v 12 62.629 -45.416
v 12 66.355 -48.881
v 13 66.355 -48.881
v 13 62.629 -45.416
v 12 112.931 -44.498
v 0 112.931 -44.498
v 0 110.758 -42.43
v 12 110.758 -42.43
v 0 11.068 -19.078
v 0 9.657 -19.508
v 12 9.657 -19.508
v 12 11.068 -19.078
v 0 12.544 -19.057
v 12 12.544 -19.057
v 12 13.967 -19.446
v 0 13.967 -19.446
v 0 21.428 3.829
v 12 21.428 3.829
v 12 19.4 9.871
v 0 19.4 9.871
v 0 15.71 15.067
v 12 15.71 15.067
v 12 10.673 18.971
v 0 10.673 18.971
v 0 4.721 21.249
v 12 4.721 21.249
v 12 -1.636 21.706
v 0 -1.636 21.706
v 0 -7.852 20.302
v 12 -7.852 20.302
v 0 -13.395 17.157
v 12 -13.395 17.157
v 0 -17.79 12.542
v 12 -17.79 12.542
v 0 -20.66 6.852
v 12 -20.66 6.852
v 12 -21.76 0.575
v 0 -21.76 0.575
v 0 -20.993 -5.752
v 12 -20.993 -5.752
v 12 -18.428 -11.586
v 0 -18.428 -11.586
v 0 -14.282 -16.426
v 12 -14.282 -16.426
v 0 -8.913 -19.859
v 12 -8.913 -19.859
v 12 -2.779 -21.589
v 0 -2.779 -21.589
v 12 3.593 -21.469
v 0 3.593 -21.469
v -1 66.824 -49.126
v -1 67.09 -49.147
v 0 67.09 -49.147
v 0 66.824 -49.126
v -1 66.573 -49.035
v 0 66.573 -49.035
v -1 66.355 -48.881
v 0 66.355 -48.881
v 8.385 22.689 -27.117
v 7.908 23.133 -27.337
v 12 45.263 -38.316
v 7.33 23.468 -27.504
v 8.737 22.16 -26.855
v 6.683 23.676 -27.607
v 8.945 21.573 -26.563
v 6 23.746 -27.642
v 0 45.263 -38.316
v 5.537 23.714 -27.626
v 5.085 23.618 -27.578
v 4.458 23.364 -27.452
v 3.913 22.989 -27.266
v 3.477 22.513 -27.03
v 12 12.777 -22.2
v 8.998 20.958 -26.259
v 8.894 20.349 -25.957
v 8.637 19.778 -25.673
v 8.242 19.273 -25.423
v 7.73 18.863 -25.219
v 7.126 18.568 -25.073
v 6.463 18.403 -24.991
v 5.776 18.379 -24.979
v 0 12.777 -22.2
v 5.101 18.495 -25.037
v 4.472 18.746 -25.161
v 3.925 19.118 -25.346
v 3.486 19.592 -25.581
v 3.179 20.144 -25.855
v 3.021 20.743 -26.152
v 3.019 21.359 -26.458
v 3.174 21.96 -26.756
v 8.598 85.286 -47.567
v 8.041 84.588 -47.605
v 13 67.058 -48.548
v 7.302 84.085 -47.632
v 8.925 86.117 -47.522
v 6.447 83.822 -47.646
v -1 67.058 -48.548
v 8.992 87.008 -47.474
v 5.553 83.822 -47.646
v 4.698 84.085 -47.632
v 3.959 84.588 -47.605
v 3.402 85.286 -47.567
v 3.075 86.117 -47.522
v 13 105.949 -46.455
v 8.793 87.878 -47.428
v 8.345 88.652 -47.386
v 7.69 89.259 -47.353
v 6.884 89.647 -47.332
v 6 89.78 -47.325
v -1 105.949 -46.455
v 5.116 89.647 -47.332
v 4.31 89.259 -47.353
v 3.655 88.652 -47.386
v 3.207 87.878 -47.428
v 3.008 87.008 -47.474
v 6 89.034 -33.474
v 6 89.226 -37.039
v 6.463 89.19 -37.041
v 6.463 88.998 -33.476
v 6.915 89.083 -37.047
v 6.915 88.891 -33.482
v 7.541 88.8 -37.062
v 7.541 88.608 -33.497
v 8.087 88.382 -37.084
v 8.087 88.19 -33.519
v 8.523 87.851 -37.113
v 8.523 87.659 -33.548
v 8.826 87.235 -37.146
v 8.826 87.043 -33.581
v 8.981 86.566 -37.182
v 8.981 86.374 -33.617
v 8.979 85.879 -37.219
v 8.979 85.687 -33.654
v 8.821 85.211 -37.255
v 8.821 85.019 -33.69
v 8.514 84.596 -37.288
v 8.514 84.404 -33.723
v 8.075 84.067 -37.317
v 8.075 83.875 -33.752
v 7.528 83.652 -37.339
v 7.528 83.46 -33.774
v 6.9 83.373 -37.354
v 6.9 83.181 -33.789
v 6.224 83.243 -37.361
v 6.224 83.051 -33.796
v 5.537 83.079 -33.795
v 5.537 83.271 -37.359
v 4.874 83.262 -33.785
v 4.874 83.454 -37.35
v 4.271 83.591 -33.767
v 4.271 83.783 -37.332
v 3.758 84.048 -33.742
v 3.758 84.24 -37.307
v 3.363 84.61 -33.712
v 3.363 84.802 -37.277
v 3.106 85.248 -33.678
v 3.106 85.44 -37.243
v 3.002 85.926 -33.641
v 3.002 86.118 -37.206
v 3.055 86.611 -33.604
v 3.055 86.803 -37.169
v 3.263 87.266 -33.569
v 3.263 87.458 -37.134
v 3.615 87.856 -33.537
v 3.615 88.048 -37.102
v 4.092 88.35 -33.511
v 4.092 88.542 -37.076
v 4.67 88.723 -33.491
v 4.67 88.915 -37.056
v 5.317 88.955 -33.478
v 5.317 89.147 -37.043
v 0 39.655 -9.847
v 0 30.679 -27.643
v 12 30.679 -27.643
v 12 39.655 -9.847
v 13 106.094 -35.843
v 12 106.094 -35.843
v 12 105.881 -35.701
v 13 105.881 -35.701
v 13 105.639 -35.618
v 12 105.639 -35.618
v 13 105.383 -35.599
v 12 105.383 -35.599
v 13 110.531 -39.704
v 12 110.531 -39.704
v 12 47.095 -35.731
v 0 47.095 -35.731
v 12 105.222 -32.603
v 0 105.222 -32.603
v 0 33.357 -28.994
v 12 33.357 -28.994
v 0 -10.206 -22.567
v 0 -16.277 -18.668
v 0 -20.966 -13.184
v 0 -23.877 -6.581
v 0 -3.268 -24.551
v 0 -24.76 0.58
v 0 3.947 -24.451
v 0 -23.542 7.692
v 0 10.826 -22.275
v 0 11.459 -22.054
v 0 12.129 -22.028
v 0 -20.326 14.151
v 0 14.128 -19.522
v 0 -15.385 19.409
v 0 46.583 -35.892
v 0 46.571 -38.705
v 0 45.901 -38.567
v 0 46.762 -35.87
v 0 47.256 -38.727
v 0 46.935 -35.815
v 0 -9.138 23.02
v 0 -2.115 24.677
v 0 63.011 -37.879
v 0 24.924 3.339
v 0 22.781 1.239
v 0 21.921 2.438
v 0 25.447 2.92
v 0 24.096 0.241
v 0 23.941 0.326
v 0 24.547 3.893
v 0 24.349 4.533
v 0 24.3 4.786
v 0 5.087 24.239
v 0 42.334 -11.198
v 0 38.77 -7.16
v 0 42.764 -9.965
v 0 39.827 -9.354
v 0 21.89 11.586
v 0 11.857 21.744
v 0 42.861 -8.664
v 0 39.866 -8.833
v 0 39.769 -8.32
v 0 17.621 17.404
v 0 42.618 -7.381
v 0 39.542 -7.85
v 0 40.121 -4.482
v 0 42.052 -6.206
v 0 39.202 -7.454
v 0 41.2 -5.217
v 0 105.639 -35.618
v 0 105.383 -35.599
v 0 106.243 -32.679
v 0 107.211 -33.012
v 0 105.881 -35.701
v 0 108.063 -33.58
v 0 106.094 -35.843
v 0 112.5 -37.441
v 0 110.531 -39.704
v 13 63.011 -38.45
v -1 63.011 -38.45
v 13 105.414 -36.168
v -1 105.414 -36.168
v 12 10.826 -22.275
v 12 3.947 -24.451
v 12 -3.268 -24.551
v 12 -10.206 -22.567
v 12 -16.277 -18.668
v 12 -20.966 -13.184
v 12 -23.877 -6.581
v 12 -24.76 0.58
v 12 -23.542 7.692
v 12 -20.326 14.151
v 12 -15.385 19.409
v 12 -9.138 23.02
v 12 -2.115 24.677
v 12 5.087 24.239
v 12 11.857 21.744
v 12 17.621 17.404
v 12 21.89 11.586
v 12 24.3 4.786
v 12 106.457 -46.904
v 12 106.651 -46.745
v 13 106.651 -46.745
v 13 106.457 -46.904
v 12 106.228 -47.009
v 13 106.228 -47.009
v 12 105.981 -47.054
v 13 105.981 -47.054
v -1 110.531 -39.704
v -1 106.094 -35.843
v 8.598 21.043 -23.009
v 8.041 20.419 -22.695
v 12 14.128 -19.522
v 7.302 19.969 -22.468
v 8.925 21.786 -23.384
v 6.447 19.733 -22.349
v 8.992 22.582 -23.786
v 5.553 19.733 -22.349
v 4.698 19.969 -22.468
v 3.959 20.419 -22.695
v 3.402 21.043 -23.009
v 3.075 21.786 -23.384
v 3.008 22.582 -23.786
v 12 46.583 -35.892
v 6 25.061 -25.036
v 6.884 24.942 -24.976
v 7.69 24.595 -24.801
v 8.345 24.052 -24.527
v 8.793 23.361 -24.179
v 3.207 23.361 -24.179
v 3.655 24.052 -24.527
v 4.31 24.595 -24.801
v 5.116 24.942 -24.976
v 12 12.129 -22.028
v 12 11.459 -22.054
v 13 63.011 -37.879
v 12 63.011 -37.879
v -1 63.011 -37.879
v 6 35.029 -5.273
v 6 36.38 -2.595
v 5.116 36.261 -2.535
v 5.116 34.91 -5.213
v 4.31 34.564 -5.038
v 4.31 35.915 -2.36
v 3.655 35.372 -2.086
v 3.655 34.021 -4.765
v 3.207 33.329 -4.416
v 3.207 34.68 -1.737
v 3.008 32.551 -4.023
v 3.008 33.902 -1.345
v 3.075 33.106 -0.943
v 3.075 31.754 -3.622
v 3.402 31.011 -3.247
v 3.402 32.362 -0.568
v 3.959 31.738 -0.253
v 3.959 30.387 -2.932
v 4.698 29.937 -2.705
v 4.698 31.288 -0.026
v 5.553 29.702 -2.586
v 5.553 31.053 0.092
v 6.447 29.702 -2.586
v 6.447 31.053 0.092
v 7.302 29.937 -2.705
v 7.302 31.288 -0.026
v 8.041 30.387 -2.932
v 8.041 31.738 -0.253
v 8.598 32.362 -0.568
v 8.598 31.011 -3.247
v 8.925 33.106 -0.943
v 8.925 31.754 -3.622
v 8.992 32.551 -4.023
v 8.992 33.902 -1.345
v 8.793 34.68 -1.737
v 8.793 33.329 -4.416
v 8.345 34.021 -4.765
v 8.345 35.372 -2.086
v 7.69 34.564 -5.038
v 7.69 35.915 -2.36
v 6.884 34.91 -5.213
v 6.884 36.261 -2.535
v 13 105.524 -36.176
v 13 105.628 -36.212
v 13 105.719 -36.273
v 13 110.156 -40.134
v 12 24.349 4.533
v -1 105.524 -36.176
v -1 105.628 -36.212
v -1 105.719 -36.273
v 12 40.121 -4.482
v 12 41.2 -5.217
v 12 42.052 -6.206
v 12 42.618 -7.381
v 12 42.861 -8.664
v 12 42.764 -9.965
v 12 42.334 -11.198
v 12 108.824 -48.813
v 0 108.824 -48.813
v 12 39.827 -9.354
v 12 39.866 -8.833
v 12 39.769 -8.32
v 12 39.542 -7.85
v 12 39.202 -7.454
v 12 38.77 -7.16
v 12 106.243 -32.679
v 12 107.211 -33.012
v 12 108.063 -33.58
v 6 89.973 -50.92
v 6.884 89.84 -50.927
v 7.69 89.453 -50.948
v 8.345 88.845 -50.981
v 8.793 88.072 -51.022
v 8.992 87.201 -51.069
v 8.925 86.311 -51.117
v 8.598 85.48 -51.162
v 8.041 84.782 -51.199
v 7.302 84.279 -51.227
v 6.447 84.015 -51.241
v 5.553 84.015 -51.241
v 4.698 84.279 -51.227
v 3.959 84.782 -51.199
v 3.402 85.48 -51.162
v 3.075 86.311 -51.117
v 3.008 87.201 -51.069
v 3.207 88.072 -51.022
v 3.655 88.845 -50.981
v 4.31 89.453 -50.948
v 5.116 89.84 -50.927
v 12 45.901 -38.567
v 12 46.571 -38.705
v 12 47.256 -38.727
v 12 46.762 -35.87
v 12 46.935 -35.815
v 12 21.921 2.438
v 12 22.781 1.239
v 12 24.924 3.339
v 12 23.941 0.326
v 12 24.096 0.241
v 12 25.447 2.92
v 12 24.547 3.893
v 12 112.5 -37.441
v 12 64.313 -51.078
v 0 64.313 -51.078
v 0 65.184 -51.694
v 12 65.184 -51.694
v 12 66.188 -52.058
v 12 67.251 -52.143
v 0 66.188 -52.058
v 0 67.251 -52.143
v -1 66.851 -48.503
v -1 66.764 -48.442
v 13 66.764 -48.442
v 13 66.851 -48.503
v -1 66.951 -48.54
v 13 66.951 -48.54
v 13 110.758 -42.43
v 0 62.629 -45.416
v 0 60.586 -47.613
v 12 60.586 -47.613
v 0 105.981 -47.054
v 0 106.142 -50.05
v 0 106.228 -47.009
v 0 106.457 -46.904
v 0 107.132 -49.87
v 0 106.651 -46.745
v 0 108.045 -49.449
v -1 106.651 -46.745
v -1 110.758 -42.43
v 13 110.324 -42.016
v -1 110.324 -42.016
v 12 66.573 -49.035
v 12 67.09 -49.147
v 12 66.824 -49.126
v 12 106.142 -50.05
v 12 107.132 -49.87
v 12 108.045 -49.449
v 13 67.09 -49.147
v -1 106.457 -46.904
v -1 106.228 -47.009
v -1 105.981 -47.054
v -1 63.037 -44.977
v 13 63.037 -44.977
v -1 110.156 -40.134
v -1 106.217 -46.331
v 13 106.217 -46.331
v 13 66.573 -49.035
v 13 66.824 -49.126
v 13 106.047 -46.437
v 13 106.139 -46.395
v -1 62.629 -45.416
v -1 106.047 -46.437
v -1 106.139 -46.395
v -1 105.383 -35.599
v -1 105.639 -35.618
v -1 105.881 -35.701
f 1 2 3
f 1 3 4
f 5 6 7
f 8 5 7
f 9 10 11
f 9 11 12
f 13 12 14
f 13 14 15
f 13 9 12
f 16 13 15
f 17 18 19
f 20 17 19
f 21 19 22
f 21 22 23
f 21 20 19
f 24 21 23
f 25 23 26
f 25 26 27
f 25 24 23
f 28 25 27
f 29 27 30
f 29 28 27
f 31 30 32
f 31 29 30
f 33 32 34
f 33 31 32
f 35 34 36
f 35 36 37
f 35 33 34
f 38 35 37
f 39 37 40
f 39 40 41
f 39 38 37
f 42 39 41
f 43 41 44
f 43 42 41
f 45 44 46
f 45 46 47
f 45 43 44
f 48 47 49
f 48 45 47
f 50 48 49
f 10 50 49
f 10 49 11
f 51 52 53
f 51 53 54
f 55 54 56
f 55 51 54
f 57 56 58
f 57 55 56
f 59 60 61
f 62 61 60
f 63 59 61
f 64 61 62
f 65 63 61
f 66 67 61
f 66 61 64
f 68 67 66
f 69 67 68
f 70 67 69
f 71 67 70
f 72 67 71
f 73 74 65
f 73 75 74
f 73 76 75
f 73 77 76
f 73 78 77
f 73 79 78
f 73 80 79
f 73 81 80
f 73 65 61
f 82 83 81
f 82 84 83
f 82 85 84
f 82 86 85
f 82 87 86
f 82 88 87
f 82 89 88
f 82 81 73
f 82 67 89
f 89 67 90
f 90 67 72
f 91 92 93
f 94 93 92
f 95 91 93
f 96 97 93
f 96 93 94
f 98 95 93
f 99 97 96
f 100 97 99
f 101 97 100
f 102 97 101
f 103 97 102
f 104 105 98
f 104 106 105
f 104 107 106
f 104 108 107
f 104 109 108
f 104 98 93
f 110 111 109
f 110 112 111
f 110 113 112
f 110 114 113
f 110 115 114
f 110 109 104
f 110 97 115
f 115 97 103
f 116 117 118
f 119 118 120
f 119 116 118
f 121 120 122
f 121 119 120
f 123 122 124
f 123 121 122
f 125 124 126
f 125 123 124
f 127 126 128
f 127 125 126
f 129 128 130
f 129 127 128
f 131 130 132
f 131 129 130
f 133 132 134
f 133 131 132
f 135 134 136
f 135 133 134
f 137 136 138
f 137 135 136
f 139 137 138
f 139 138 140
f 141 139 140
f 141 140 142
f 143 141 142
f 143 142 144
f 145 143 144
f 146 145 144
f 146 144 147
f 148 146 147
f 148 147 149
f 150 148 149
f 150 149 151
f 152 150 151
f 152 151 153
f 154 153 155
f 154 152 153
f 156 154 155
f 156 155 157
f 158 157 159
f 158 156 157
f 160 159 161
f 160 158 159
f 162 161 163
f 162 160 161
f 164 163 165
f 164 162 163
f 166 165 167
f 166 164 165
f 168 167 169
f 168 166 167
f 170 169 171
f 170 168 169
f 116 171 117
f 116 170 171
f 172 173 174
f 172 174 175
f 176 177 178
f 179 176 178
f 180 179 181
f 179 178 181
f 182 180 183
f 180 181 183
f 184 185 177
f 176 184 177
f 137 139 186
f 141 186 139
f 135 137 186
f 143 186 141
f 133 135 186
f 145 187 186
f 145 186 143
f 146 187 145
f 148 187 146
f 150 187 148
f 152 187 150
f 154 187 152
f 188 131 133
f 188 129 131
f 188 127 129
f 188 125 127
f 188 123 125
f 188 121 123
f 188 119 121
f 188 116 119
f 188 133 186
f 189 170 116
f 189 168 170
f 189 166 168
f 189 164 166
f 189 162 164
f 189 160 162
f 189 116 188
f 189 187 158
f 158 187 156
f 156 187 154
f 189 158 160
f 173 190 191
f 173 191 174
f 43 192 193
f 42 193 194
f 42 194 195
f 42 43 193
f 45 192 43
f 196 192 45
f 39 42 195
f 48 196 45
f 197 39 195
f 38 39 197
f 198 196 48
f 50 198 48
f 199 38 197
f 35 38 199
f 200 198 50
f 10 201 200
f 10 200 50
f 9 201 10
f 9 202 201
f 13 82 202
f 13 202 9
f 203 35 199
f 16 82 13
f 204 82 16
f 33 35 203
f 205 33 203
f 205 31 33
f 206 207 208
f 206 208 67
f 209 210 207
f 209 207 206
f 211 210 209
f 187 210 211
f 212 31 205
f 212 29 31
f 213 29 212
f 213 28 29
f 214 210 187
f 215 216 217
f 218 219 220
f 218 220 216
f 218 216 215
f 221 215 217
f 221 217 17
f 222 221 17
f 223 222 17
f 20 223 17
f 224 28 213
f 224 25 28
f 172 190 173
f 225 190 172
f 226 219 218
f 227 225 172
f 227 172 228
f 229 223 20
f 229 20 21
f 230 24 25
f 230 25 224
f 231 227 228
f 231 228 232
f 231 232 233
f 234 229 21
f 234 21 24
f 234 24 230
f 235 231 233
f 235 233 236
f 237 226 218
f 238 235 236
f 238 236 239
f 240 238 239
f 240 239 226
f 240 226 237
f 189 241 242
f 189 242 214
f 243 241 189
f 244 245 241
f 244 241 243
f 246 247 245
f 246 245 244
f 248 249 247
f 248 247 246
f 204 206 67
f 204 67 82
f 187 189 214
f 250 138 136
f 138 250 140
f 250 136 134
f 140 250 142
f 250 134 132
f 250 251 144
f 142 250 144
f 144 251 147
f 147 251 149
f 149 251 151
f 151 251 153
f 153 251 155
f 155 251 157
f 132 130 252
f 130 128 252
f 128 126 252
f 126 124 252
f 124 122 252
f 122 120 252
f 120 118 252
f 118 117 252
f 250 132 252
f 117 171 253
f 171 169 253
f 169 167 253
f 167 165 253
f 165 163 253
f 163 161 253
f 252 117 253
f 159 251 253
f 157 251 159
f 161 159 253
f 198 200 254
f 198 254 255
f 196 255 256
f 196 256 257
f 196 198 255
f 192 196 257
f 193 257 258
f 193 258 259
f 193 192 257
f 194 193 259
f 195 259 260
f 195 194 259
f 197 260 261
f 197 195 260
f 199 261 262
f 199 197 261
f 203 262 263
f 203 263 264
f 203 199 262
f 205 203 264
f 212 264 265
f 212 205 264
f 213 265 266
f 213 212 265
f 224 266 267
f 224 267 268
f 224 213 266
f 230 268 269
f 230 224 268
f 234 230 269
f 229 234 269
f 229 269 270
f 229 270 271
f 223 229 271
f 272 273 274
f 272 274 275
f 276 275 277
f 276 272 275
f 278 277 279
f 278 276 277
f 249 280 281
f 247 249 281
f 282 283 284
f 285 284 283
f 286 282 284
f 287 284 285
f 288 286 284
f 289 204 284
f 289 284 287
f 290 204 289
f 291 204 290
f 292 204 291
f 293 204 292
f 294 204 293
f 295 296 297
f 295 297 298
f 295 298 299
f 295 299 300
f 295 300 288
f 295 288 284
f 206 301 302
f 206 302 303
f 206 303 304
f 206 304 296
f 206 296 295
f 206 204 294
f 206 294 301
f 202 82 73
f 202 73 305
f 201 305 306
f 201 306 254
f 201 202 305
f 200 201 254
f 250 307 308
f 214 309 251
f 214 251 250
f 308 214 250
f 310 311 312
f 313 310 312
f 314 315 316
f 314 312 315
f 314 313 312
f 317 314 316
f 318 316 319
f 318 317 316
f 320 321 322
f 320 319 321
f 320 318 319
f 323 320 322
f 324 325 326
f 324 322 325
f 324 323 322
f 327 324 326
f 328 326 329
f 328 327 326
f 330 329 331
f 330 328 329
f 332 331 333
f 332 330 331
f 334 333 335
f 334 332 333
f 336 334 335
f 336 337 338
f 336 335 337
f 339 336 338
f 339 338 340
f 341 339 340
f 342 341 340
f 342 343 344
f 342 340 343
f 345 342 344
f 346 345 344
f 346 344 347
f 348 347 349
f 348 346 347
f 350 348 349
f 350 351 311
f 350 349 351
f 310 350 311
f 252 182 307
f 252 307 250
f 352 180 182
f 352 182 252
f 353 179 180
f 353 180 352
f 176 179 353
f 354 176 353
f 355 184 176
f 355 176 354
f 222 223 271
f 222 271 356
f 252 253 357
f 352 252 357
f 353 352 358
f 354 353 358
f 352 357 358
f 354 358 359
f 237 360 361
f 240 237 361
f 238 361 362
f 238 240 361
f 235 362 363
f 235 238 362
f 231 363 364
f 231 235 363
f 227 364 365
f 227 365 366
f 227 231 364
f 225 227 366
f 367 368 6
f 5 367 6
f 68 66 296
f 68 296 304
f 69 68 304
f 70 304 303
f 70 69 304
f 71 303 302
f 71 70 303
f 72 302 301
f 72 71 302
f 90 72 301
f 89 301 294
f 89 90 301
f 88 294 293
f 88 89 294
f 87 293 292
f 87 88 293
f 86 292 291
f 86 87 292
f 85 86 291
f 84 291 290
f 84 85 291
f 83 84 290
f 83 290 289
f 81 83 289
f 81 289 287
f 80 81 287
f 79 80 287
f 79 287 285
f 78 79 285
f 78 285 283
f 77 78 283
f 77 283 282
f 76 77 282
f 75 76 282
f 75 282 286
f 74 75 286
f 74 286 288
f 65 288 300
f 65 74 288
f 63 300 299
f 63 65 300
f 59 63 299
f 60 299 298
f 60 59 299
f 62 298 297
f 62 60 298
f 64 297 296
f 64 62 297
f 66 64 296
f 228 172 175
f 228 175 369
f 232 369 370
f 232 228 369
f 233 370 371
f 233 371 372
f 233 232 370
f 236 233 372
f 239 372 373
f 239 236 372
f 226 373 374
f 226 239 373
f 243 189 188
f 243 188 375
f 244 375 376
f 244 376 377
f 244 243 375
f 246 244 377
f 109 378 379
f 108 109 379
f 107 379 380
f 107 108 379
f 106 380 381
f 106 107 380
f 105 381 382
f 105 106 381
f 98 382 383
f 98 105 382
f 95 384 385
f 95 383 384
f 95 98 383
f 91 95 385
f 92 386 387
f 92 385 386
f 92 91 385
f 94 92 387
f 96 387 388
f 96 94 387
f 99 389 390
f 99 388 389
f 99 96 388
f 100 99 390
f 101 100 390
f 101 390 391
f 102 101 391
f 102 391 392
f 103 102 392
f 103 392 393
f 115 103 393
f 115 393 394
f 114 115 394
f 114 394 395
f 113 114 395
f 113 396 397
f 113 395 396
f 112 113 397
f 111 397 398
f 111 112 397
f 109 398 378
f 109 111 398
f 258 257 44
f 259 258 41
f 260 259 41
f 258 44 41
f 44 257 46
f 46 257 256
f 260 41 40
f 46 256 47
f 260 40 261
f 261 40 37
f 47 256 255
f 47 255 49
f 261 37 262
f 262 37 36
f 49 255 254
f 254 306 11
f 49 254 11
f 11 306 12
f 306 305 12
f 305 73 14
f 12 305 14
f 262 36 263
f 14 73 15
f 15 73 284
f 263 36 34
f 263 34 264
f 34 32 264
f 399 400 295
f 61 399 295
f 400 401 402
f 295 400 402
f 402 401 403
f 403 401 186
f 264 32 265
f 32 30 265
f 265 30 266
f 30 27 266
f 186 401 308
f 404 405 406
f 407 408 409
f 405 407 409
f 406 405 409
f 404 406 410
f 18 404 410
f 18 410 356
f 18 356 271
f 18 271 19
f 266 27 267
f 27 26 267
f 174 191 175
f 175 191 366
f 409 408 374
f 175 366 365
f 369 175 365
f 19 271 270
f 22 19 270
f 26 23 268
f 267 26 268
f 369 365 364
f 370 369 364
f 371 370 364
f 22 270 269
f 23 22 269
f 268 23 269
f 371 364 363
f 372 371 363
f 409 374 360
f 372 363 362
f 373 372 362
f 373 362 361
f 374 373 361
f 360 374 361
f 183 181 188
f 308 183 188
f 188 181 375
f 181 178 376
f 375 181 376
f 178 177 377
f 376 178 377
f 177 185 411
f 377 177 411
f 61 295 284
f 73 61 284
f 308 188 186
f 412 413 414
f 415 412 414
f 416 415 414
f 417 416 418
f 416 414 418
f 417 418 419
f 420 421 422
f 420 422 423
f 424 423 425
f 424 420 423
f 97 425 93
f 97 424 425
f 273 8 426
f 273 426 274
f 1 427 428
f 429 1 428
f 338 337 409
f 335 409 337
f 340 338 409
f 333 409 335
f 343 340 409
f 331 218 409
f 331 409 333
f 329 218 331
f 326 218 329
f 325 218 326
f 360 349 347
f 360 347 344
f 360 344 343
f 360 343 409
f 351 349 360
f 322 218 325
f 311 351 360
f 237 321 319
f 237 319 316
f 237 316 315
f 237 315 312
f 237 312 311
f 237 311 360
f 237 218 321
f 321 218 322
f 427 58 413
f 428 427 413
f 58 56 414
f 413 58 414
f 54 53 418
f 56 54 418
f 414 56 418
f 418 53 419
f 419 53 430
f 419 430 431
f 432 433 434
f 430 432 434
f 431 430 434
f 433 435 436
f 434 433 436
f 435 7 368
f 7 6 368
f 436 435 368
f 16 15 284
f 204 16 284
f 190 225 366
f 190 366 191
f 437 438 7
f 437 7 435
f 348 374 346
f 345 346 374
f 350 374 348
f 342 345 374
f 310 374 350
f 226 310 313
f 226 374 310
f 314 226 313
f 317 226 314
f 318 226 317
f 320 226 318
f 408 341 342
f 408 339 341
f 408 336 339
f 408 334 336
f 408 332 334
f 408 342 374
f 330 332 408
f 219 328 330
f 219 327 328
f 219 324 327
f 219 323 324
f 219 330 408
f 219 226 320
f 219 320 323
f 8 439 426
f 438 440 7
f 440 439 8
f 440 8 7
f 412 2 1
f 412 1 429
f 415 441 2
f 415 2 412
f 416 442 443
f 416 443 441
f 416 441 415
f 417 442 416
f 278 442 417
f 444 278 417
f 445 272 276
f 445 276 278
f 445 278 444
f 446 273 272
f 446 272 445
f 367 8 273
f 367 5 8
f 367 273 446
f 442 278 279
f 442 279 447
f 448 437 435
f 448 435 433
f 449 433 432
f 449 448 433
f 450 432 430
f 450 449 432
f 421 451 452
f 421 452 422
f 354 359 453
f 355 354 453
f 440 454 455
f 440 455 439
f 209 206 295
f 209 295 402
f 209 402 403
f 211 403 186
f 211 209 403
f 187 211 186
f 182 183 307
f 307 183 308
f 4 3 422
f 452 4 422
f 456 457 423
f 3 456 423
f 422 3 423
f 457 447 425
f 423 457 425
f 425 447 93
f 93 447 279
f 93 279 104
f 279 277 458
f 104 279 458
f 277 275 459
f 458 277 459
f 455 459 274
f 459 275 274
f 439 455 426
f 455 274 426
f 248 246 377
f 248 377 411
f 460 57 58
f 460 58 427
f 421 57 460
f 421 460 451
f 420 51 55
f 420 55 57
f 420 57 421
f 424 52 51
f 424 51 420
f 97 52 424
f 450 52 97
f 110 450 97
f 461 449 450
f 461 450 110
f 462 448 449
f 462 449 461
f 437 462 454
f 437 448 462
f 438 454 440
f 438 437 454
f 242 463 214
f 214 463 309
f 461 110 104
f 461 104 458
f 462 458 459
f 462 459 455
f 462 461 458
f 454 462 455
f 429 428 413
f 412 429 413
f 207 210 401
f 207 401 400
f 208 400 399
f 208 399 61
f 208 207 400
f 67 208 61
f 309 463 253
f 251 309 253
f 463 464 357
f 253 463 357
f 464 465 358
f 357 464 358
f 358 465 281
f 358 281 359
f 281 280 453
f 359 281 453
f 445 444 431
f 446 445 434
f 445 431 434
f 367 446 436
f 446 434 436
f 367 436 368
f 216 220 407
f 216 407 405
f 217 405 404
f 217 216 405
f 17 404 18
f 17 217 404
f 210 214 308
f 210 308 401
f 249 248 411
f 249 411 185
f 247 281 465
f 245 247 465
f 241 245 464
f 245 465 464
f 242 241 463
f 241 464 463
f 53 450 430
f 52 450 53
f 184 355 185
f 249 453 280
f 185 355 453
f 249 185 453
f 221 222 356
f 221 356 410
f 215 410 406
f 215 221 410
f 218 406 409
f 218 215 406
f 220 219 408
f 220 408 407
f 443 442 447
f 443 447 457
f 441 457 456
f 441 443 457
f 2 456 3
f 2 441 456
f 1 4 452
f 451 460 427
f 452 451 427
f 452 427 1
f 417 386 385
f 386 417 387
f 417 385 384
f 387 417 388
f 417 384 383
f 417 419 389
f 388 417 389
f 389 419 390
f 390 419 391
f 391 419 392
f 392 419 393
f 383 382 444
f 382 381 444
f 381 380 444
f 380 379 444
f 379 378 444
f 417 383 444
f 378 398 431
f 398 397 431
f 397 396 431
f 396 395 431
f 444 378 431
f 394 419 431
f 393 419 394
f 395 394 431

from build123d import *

# Parameters (mm, degrees)
Y_KSEKLIK_EKSTR_ZYON1_DEPTH      = 12
Y_KSEKLIK_EKSTR_ZYON1_2_DEPTH    = 12
Y_KSEKLIK_EKSTR_ZYON2_DEPTH      = 13
Y_KSEKLIK_EKSTR_ZYON2_DEPTH_BACK = 1
KES_EKSTR_ZYON1_DEPTH            = 137.801379342
KES_EKSTR_ZYON1_DEPTH_BACK       = 137.801379342
IZIM3_R                          = 3
KES_EKSTR_ZYON2_DEPTH            = 126.375180465
KES_EKSTR_ZYON2_DEPTH_BACK       = 126.375180465
IZIM4_R                          = 3


with BuildPart() as part:
    # Çizim1 → Yükseklik-Ekstrüzyon1 (new body)
    with BuildSketch(Plane(origin=(0, 0, 0), x_dir=(0, 0, -1), z_dir=(1, 0, 0))):
        with BuildLine():
            Line((39.703698303, 110.530564835), (35.842735006, 106.093640789))
            ThreePointArc((35.842735006, 106.093640789), (35.651443933, 105.762341111), (35.598552367, 105.383455596))
            Line((35.598552367, 105.383455596), (38.726763322, 47.255829212))
            ThreePointArc((38.726763322, 47.255829212), (38.650109509, 46.232992954), (38.315858613, 45.263278483))
            Line((38.315858613, 45.263278483), (22.20008442, 12.776775479))
            ThreePointArc((22.20008442, 12.776775479), (22.01624938, 11.793069649), (22.275463947, 10.826487893))
            ThreePointArc((22.275463947, 10.826487893), (-11.039027997, -22.170904245), (-4.785595814, 24.300354048))
            Line((-4.785595814, 24.300354048), (-4.533073597, 24.348724359))
            ThreePointArc((-4.533073597, 24.348724359), (-3.601683862, 24.714764855), (-2.919855141, 25.447282485))
            Line((-2.919855141, 25.447282485), (4.481637012, 40.121125879))
            ThreePointArc((4.481637012, 40.121125879), (7.381427348, 42.618299671), (11.19765728, 42.333606783))
            Line((11.19765728, 42.333606783), (28.993707017, 33.357272572))
            Line((28.993707017, 33.357272572), (27.642645207, 30.67872222))
            Line((27.642645207, 30.67872222), (9.846595471, 39.655056431))
            ThreePointArc((9.846595471, 39.655056431), (8.320103498, 39.768933586), (7.160187363, 38.77006407))
            Line((7.160187363, 38.77006407), (-0.241304789, 24.096220675))
            Line((-0.241304789, 24.096220675), (-0.325680691, 23.940544642))
            ThreePointArc((-0.325680691, 23.940544642), (-1.807938736, 22.308616532), (-3.828892979, 21.427695299))
            ThreePointArc((-3.828892979, 21.427695299), (-9.802898187, -19.434755836), (19.507842092, 9.656637312))
            ThreePointArc((19.507842092, 9.656637312), (19.015096672, 11.805469604), (19.446489735, 13.967454409))
            Line((19.446489735, 13.967454409), (19.521534068, 14.127837289))
            Line((19.521534068, 14.127837289), (35.891741207, 46.582624912))
            ThreePointArc((35.891741207, 46.582624912), (35.846402617, 46.849595664), (35.731098192, 47.094613744))
            Line((35.731098192, 47.094613744), (32.602887237, 105.222240128))
            ThreePointArc((32.602887237, 105.222240128), (32.814453502, 106.737782188), (33.579617792, 108.062980901))
            Line((33.579617792, 108.062980901), (37.440581089, 112.499904947))
            Line((37.440581089, 112.499904947), (39.703698303, 110.530564835))
        make_face()
    extrude(amount=Y_KSEKLIK_EKSTR_ZYON1_DEPTH)



with BuildPart() as body_2:
    # Çizim1 → Y_kseklik-Ekstr_zyon1 2 (new body)
    with BuildSketch(Plane(origin=(0, 0, 0), x_dir=(0, 0, -1), z_dir=(1, 0, 0))):
        with BuildLine():
            Line((42.430036911, 110.758141291), (46.744907402, 106.651384134))
            ThreePointArc((46.744907402, 106.651384134), (46.963640098, 106.345658403), (47.05403938, 105.980774606))
            Line((47.05403938, 105.980774606), (49.147439107, 67.090085781))
            ThreePointArc((49.147439107, 67.090085781), (49.08906574, 66.695660627), (48.881223656, 66.355395554))
            Line((48.881223656, 66.355395554), (45.416029412, 62.628641566))
            Line((45.416029412, 62.628641566), (47.613046335, 60.585820811))
            Line((47.613046335, 60.585820811), (51.078240579, 64.312574798))
            ThreePointArc((51.078240579, 64.312574798), (51.909608915, 65.673635091), (52.143102382, 67.251335707))
            Line((52.143102382, 67.251335707), (50.049702655, 106.142024532))
            ThreePointArc((50.049702655, 106.142024532), (49.688105529, 107.601559718), (48.813174743, 108.824462642))
            Line((48.813174743, 108.824462642), (44.498304253, 112.9312198))
            Line((44.498304253, 112.9312198), (42.430036911, 110.758141291))
        make_face()
    extrude(amount=Y_KSEKLIK_EKSTR_ZYON1_2_DEPTH)


with BuildPart() as part_1:
    add(part.part)

    add(body_2.part)  # Yükseklik-Ekstrüzyon2 merges body 2
    # Çizim2 → Yükseklik-Ekstrüzyon2 (add, two sides: drawn at the far end of the back side and taken through both)
    with BuildSketch(Plane(origin=(0, 0, 0), x_dir=(0, 0, -1), z_dir=(1, 0, 0)).offset(-Y_KSEKLIK_EKSTR_ZYON2_DEPTH_BACK)):
        with BuildLine():
            Line((39.703698303, 110.530564835), (35.842735006, 106.093640789))
            ThreePointArc((35.842735006, 106.093640789), (35.651443933, 105.762341111), (35.598552367, 105.383455596))
            Line((35.598552367, 105.383455596), (37.878903007, 63.010555577))
            Line((37.878903007, 63.010555577), (38.449727824, 63.010555577))
            Line((38.449727824, 63.010555577), (36.167728742, 105.414086535))
            ThreePointArc((36.167728742, 105.414086535), (36.190472115, 105.577007306), (36.272727276, 105.719466168))
            Line((36.272727276, 105.719466168), (40.133690573, 110.156390214))
            Line((40.133690573, 110.156390214), (39.703698303, 110.530564835))
        make_face()
        with BuildLine():
            Line((42.430036911, 110.758141291), (46.744907402, 106.651384134))
            ThreePointArc((46.744907402, 106.651384134), (46.963640098, 106.345658403), (47.05403938, 105.980774606))
            Line((47.05403938, 105.980774606), (49.147439107, 67.090085781))
            ThreePointArc((49.147439107, 67.090085781), (49.08906574, 66.695660627), (48.881223656, 66.355395554))
            Line((48.881223656, 66.355395554), (45.416029412, 62.628641566))
            Line((45.416029412, 62.628641566), (44.976626027, 63.037205717))
            Line((44.976626027, 63.037205717), (48.441820271, 66.763959705))
            ThreePointArc((48.441820271, 66.763959705), (48.524957105, 66.900065734), (48.548306451, 67.057835796))
            Line((48.548306451, 67.057835796), (46.454906724, 105.948524621))
            ThreePointArc((46.454906724, 105.948524621), (46.418747012, 106.09447814), (46.331253933, 106.216768432))
            Line((46.331253933, 106.216768432), (42.016383443, 110.32352559))
            Line((42.016383443, 110.32352559), (42.430036911, 110.758141291))
        make_face()
    extrude(amount=Y_KSEKLIK_EKSTR_ZYON2_DEPTH + Y_KSEKLIK_EKSTR_ZYON2_DEPTH_BACK)

    # Çizim3 → Kes-Ekstrüzyon1 (cut, two sides: drawn at the far end of the back side and taken through both)
    with BuildSketch(Plane(origin=(0, 2.992932096, -55.601990066), x_dir=(-1, 0, 0), z_dir=(0, 0.053749975234598533, -0.9985544252379438)).offset(-KES_EKSTR_ZYON1_DEPTH_BACK)):
        with Locations(Location((-6, 84.106186527, 0), (0, 0, 90))):
            Circle(IZIM3_R)
    extrude(amount=KES_EKSTR_ZYON1_DEPTH + KES_EKSTR_ZYON1_DEPTH_BACK, mode=Mode.SUBTRACT)

    # Çizim4 → Kes-Ekstrüzyon2 (cut, two sides: drawn at the far end of the back side and taken through both)
    with BuildSketch(Plane(origin=(0, 6.335253503, 12.55996978), x_dir=(1, 0, 0), z_dir=(0, 0.45035393648807964, 0.8928501172591571)).offset(-KES_EKSTR_ZYON2_DEPTH_BACK)):
        with Locations(Location((6, 30.650474816, 0), (0, 0, 90))):
            Circle(IZIM4_R)
    extrude(amount=KES_EKSTR_ZYON2_DEPTH + KES_EKSTR_ZYON2_DEPTH_BACK, mode=Mode.SUBTRACT)


solid = part_1.part
